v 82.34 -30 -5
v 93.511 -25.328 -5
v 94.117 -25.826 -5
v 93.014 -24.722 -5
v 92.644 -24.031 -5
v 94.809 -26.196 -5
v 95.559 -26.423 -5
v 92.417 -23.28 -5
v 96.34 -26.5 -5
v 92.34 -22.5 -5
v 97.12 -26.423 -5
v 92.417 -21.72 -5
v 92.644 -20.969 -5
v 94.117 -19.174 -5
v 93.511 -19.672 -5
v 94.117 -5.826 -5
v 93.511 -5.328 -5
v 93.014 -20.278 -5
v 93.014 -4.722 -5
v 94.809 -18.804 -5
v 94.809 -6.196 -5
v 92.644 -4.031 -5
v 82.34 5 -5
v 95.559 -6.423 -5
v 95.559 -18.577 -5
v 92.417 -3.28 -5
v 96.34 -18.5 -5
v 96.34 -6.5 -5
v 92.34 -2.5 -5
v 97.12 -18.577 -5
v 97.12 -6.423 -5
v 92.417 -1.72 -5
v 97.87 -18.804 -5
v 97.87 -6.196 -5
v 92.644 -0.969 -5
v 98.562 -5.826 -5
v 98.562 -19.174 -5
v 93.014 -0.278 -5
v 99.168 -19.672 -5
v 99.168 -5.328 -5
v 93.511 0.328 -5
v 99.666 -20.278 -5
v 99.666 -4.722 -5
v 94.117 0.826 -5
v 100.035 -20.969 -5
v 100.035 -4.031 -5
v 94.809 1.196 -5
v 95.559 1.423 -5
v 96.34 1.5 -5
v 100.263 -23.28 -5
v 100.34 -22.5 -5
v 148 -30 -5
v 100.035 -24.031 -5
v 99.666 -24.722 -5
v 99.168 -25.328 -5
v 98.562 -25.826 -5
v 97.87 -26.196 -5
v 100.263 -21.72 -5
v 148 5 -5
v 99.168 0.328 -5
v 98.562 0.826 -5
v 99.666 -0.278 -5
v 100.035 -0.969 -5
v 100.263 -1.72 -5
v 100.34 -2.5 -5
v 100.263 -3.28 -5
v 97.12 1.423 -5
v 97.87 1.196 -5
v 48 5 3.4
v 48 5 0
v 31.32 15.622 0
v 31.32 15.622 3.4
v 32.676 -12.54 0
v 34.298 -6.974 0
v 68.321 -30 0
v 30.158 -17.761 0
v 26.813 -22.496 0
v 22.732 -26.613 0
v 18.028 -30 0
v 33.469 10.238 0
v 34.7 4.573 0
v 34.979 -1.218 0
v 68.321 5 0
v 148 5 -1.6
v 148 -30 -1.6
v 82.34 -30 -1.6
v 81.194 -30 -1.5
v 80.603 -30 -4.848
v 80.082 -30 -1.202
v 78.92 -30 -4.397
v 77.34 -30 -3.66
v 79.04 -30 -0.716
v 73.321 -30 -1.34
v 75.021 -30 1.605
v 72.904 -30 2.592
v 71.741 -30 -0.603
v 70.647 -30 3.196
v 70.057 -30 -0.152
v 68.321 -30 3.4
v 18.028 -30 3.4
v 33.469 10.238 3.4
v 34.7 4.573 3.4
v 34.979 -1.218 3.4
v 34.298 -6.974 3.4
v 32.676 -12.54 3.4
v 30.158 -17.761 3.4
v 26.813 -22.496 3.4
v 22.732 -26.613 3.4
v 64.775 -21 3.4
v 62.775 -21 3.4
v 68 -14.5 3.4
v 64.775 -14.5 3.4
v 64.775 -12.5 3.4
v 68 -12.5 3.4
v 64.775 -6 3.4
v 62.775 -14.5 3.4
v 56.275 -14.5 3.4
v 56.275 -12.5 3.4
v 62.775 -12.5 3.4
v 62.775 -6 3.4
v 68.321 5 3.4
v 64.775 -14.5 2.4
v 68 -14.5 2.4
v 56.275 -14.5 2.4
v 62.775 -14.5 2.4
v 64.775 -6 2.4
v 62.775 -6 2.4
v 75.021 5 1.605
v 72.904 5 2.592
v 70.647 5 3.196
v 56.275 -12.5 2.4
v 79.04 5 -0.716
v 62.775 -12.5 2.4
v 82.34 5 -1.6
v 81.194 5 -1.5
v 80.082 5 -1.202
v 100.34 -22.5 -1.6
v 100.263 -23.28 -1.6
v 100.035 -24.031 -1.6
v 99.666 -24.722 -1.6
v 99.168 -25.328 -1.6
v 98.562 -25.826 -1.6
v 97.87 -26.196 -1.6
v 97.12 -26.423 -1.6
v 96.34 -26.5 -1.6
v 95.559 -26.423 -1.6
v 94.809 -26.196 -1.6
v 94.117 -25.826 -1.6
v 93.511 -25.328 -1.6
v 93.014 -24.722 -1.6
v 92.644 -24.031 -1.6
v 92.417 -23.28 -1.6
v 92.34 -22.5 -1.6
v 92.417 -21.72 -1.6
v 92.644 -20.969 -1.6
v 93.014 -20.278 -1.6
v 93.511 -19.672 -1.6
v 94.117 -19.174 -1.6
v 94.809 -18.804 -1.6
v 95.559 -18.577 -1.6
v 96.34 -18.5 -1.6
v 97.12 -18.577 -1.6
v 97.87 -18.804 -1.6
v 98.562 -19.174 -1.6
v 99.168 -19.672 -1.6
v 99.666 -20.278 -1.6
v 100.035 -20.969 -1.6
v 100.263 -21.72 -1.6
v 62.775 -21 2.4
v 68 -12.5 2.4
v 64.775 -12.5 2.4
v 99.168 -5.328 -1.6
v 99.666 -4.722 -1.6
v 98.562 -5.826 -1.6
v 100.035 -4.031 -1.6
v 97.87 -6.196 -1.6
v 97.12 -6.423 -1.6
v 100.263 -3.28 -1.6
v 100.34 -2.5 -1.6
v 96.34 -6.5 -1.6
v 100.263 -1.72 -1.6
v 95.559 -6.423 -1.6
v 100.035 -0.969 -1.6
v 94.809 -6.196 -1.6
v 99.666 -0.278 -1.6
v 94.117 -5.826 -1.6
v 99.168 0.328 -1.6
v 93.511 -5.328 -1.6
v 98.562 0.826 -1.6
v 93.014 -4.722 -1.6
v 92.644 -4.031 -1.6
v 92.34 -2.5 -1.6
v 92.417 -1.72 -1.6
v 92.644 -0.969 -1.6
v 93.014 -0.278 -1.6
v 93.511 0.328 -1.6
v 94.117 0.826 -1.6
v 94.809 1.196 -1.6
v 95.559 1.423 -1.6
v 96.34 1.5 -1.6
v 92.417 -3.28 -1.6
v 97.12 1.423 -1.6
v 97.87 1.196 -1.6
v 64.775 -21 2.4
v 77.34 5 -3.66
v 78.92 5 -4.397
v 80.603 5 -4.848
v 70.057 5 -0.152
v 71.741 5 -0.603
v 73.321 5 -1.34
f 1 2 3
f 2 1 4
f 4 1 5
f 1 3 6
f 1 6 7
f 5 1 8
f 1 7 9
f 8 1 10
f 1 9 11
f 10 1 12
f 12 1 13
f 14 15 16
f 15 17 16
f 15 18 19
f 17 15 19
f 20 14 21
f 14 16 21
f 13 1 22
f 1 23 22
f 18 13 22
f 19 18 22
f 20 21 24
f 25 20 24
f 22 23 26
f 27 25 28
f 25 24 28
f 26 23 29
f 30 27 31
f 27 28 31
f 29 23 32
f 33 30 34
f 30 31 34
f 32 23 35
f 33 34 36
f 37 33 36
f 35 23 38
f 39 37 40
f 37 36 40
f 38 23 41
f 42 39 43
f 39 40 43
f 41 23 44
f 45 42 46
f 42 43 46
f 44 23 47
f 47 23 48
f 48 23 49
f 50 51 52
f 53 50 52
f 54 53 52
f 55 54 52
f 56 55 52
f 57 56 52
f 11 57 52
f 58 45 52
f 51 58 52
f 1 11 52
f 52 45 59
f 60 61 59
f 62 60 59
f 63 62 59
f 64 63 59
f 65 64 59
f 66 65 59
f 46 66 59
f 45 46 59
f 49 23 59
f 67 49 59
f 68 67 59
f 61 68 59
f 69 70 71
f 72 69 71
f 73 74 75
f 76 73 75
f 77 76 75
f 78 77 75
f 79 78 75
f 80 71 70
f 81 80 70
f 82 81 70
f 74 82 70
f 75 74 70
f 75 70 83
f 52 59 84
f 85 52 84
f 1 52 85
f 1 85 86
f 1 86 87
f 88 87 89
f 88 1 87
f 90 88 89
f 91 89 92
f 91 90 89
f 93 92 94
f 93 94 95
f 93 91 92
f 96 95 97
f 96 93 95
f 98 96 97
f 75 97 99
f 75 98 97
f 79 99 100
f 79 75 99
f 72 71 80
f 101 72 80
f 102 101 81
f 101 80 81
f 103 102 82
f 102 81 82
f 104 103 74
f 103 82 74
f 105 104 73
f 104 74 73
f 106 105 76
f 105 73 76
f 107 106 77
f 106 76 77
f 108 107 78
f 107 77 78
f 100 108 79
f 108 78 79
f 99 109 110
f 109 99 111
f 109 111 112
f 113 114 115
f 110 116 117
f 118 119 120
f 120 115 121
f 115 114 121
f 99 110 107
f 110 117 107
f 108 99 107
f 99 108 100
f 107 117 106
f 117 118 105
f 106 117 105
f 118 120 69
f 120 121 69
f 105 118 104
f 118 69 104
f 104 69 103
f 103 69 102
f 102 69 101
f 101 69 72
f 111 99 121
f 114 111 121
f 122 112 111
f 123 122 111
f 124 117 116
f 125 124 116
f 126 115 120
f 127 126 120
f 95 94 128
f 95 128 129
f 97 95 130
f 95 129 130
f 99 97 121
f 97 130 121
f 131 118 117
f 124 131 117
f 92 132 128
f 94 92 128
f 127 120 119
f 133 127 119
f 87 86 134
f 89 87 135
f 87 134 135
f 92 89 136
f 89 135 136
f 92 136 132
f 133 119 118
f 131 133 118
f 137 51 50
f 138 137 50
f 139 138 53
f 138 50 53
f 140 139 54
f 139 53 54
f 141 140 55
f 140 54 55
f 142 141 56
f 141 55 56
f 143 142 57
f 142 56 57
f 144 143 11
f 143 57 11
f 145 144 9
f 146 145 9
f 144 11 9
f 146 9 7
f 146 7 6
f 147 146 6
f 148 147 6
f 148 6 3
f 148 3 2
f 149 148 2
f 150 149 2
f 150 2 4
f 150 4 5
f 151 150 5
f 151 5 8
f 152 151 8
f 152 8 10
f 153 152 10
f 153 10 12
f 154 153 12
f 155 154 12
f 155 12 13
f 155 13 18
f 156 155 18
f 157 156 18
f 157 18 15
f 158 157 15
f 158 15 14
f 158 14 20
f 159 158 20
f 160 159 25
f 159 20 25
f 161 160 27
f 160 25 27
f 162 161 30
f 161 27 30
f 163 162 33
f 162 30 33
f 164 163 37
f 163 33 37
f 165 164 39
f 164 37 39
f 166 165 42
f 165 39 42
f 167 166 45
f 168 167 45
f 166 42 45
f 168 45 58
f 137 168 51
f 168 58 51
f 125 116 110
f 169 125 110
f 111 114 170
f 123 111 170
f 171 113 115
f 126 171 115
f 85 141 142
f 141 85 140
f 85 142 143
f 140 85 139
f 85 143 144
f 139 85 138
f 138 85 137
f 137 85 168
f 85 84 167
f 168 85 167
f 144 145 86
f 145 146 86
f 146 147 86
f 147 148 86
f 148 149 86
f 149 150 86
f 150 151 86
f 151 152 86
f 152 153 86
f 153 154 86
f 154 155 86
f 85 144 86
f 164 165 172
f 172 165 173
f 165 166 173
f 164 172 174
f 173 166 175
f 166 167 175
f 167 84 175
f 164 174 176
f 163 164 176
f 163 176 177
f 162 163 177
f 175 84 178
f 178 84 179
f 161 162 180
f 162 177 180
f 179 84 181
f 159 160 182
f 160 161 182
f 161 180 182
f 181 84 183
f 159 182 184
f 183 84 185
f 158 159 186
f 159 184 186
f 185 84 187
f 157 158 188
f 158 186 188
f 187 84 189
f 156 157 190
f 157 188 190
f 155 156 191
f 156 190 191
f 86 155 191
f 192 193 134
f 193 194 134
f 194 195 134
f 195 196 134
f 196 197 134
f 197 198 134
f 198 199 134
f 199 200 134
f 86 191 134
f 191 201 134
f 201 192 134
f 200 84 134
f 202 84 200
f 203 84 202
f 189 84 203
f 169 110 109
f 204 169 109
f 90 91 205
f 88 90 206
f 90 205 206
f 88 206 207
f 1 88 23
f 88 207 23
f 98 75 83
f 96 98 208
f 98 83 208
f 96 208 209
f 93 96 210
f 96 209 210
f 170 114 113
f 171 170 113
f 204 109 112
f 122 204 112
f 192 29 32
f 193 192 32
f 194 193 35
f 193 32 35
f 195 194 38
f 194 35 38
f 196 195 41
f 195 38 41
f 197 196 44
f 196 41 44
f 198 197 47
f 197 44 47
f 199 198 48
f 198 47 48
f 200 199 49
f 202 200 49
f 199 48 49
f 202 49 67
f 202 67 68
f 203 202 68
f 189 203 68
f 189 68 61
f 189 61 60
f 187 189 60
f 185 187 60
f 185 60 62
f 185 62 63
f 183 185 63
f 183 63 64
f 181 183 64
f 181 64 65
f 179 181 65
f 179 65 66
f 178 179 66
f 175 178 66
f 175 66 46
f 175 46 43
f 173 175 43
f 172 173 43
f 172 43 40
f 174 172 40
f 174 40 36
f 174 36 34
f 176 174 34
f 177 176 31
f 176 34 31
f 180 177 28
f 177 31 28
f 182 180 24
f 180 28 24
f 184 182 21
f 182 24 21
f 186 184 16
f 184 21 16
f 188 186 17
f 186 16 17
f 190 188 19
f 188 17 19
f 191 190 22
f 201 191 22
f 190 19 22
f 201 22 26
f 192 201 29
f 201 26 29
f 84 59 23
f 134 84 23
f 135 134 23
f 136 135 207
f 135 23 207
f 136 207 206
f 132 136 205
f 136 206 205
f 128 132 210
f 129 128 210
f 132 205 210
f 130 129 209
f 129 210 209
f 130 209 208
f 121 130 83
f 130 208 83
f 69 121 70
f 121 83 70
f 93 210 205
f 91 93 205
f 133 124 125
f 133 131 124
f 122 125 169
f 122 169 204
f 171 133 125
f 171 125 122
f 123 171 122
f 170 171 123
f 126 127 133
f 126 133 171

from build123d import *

# Parameters (mm, degrees)
BOSS_EXTRUDE1_DEPTH = 3.4
SKETCH3_R           = 5
CUT_EXTRUDE1_DEPTH  = 6
CUT_EXTRUDE2_DEPTH  = 10
SKETCH6_R           = 35
CUT_EXTRUDE3_DEPTH  = 10
CUT_EXTRUDE4_DEPTH  = 1
CUT_EXTRUDE5_REACH  = 87.508
SKETCH8_W           = 12
SKETCH8_H           = 35
BOSS_EXTRUDE2_DEPTH = 35
SKETCH10_R          = 4
CUT_EXTRUDE6_DEPTH  = 10


with BuildPart() as part:
    # Sketch1 → Boss-Extrude1 (new body)
    with BuildSketch(Plane.XY):
        with BuildLine():
            Line((0, -30), (80, -30))
            Line((80, -30), (80, 5))
            Line((80, 5), (48, 5))
            Line((48, 5), (16.114075804, 25.304872277))
            ThreePointArc((16.114075804, 25.304872277), (-28.802310396, 8.392074585), (0, -30))
        make_face()
    extrude(amount=BOSS_EXTRUDE1_DEPTH)

    # Sketch3 → Cut-Extrude1 (cut)
    with BuildSketch(Plane.XY.offset(3.4)):
        Circle(SKETCH3_R)
    extrude(amount=-CUT_EXTRUDE1_DEPTH, mode=Mode.SUBTRACT)

    # Sketch5 → Cut-Extrude2 (cut)
    with BuildSketch(Plane.XY.offset(3.4)):
        with BuildLine():
            ThreePointArc((0, 10), (-8.660254038, 5), (-8.660254038, -5))
            ThreePointArc((-8.660254038, -5), (-10.124355653, -10.464101615), (-15.588457268, -9))
            ThreePointArc((-15.588457268, -9), (-15.588457268, 9), (0, 18))
            ThreePointArc((0, 18), (4, 14), (0, 10))
        make_face()
    extrude(amount=-CUT_EXTRUDE2_DEPTH, mode=Mode.SUBTRACT)

    # Sketch6 → Cut-Extrude3 (cut)
    with BuildSketch(Plane(origin=(0, 0, 0), x_dir=(-1, 0, 0), z_dir=(0, 0, -1))):
        Circle(SKETCH6_R)
    extrude(amount=-CUT_EXTRUDE3_DEPTH, mode=Mode.SUBTRACT)

    # Sketch7 → Cut-Extrude4 (cut)
    with BuildSketch(Plane.XY.offset(3.4)):
        Polygon((62.77538264, -14.5), (62.77538264, -21), (64.77538264, -21), (64.77538264, -14.5), (71.27538264, -14.5), (71.27538264, -12.5), (64.77538264, -12.5), (64.77538264, -6), (62.77538264, -6), (62.77538264, -12.5), (56.27538264, -12.5), (56.27538264, -14.5), align=None)
    extrude(amount=-CUT_EXTRUDE4_DEPTH, mode=Mode.SUBTRACT)

    # Sketch8 → Cut-Extrude5 (cut, up to next)
    with BuildSketch(Plane(origin=(0, 0, 0), x_dir=(-1, 0, 0), z_dir=(0, 0, -1)), mode=Mode.PRIVATE) as cut_extrude5_sk1:
        with Locations((-74, -12.5)):
            Rectangle(SKETCH8_W, SKETCH8_H)
    cut_extrude5_tool1 = extrude(cut_extrude5_sk1.sketch, amount=-CUT_EXTRUDE5_REACH, mode=Mode.PRIVATE) & part.part
    add(cut_extrude5_tool1.solids().sort_by_distance((74, -12.5, 0))[0], mode=Mode.SUBTRACT)

    # Sketch9 → Boss-Extrude2 (add)
    with BuildSketch(Plane(origin=(0, 5, 0), x_dir=(1, 0, 0), z_dir=(0, 1, 0))):
        with BuildLine():
            Line((68, 0), (68.320508076, 0))
            ThreePointArc((68.320508076, 0), (70.908698527, 0.340741737), (73.320508076, 1.339745962))
            Line((73.320508076, 1.339745962), (77.339745962, 3.660254038))
            ThreePointArc((77.339745962, 3.660254038), (79.751555511, 4.659258263), (82.339745962, 5))
            Line((82.339745962, 5), (83, 5))
            Line((83, 5), (148, 5))
            Line((148, 5), (148, 1.6))
            Line((148, 1.6), (83, 1.6))
            Line((83, 1.6), (82.339745962, 1.6))
            ThreePointArc((82.339745962, 1.6), (80.631540264, 1.375110454), (79.039745962, 0.715767665))
            Line((79.039745962, 0.715767665), (75.020508076, -1.604740411))
            ThreePointArc((75.020508076, -1.604740411), (71.78868328, -2.943406072), (68.320508076, -3.4))
            Line((68.320508076, -3.4), (68, -3.4))
            Line((68, -3.4), (68, 0))
        make_face()
    extrude(amount=-BOSS_EXTRUDE2_DEPTH)

    # Sketch10 → Cut-Extrude6 (cut)
    with BuildSketch(Plane(origin=(0, 0, -5), x_dir=(-1, 0, 0), z_dir=(0, 0, -1))):
        with Locations((-96.339745962, -2.5)):
            Circle(SKETCH10_R)
        with Locations(Location((-96.339745962, -22.5, 0), (0, 0, 180))):
            Circle(SKETCH10_R)
    extrude(amount=-CUT_EXTRUDE6_DEPTH, mode=Mode.SUBTRACT)


solid = part.part
